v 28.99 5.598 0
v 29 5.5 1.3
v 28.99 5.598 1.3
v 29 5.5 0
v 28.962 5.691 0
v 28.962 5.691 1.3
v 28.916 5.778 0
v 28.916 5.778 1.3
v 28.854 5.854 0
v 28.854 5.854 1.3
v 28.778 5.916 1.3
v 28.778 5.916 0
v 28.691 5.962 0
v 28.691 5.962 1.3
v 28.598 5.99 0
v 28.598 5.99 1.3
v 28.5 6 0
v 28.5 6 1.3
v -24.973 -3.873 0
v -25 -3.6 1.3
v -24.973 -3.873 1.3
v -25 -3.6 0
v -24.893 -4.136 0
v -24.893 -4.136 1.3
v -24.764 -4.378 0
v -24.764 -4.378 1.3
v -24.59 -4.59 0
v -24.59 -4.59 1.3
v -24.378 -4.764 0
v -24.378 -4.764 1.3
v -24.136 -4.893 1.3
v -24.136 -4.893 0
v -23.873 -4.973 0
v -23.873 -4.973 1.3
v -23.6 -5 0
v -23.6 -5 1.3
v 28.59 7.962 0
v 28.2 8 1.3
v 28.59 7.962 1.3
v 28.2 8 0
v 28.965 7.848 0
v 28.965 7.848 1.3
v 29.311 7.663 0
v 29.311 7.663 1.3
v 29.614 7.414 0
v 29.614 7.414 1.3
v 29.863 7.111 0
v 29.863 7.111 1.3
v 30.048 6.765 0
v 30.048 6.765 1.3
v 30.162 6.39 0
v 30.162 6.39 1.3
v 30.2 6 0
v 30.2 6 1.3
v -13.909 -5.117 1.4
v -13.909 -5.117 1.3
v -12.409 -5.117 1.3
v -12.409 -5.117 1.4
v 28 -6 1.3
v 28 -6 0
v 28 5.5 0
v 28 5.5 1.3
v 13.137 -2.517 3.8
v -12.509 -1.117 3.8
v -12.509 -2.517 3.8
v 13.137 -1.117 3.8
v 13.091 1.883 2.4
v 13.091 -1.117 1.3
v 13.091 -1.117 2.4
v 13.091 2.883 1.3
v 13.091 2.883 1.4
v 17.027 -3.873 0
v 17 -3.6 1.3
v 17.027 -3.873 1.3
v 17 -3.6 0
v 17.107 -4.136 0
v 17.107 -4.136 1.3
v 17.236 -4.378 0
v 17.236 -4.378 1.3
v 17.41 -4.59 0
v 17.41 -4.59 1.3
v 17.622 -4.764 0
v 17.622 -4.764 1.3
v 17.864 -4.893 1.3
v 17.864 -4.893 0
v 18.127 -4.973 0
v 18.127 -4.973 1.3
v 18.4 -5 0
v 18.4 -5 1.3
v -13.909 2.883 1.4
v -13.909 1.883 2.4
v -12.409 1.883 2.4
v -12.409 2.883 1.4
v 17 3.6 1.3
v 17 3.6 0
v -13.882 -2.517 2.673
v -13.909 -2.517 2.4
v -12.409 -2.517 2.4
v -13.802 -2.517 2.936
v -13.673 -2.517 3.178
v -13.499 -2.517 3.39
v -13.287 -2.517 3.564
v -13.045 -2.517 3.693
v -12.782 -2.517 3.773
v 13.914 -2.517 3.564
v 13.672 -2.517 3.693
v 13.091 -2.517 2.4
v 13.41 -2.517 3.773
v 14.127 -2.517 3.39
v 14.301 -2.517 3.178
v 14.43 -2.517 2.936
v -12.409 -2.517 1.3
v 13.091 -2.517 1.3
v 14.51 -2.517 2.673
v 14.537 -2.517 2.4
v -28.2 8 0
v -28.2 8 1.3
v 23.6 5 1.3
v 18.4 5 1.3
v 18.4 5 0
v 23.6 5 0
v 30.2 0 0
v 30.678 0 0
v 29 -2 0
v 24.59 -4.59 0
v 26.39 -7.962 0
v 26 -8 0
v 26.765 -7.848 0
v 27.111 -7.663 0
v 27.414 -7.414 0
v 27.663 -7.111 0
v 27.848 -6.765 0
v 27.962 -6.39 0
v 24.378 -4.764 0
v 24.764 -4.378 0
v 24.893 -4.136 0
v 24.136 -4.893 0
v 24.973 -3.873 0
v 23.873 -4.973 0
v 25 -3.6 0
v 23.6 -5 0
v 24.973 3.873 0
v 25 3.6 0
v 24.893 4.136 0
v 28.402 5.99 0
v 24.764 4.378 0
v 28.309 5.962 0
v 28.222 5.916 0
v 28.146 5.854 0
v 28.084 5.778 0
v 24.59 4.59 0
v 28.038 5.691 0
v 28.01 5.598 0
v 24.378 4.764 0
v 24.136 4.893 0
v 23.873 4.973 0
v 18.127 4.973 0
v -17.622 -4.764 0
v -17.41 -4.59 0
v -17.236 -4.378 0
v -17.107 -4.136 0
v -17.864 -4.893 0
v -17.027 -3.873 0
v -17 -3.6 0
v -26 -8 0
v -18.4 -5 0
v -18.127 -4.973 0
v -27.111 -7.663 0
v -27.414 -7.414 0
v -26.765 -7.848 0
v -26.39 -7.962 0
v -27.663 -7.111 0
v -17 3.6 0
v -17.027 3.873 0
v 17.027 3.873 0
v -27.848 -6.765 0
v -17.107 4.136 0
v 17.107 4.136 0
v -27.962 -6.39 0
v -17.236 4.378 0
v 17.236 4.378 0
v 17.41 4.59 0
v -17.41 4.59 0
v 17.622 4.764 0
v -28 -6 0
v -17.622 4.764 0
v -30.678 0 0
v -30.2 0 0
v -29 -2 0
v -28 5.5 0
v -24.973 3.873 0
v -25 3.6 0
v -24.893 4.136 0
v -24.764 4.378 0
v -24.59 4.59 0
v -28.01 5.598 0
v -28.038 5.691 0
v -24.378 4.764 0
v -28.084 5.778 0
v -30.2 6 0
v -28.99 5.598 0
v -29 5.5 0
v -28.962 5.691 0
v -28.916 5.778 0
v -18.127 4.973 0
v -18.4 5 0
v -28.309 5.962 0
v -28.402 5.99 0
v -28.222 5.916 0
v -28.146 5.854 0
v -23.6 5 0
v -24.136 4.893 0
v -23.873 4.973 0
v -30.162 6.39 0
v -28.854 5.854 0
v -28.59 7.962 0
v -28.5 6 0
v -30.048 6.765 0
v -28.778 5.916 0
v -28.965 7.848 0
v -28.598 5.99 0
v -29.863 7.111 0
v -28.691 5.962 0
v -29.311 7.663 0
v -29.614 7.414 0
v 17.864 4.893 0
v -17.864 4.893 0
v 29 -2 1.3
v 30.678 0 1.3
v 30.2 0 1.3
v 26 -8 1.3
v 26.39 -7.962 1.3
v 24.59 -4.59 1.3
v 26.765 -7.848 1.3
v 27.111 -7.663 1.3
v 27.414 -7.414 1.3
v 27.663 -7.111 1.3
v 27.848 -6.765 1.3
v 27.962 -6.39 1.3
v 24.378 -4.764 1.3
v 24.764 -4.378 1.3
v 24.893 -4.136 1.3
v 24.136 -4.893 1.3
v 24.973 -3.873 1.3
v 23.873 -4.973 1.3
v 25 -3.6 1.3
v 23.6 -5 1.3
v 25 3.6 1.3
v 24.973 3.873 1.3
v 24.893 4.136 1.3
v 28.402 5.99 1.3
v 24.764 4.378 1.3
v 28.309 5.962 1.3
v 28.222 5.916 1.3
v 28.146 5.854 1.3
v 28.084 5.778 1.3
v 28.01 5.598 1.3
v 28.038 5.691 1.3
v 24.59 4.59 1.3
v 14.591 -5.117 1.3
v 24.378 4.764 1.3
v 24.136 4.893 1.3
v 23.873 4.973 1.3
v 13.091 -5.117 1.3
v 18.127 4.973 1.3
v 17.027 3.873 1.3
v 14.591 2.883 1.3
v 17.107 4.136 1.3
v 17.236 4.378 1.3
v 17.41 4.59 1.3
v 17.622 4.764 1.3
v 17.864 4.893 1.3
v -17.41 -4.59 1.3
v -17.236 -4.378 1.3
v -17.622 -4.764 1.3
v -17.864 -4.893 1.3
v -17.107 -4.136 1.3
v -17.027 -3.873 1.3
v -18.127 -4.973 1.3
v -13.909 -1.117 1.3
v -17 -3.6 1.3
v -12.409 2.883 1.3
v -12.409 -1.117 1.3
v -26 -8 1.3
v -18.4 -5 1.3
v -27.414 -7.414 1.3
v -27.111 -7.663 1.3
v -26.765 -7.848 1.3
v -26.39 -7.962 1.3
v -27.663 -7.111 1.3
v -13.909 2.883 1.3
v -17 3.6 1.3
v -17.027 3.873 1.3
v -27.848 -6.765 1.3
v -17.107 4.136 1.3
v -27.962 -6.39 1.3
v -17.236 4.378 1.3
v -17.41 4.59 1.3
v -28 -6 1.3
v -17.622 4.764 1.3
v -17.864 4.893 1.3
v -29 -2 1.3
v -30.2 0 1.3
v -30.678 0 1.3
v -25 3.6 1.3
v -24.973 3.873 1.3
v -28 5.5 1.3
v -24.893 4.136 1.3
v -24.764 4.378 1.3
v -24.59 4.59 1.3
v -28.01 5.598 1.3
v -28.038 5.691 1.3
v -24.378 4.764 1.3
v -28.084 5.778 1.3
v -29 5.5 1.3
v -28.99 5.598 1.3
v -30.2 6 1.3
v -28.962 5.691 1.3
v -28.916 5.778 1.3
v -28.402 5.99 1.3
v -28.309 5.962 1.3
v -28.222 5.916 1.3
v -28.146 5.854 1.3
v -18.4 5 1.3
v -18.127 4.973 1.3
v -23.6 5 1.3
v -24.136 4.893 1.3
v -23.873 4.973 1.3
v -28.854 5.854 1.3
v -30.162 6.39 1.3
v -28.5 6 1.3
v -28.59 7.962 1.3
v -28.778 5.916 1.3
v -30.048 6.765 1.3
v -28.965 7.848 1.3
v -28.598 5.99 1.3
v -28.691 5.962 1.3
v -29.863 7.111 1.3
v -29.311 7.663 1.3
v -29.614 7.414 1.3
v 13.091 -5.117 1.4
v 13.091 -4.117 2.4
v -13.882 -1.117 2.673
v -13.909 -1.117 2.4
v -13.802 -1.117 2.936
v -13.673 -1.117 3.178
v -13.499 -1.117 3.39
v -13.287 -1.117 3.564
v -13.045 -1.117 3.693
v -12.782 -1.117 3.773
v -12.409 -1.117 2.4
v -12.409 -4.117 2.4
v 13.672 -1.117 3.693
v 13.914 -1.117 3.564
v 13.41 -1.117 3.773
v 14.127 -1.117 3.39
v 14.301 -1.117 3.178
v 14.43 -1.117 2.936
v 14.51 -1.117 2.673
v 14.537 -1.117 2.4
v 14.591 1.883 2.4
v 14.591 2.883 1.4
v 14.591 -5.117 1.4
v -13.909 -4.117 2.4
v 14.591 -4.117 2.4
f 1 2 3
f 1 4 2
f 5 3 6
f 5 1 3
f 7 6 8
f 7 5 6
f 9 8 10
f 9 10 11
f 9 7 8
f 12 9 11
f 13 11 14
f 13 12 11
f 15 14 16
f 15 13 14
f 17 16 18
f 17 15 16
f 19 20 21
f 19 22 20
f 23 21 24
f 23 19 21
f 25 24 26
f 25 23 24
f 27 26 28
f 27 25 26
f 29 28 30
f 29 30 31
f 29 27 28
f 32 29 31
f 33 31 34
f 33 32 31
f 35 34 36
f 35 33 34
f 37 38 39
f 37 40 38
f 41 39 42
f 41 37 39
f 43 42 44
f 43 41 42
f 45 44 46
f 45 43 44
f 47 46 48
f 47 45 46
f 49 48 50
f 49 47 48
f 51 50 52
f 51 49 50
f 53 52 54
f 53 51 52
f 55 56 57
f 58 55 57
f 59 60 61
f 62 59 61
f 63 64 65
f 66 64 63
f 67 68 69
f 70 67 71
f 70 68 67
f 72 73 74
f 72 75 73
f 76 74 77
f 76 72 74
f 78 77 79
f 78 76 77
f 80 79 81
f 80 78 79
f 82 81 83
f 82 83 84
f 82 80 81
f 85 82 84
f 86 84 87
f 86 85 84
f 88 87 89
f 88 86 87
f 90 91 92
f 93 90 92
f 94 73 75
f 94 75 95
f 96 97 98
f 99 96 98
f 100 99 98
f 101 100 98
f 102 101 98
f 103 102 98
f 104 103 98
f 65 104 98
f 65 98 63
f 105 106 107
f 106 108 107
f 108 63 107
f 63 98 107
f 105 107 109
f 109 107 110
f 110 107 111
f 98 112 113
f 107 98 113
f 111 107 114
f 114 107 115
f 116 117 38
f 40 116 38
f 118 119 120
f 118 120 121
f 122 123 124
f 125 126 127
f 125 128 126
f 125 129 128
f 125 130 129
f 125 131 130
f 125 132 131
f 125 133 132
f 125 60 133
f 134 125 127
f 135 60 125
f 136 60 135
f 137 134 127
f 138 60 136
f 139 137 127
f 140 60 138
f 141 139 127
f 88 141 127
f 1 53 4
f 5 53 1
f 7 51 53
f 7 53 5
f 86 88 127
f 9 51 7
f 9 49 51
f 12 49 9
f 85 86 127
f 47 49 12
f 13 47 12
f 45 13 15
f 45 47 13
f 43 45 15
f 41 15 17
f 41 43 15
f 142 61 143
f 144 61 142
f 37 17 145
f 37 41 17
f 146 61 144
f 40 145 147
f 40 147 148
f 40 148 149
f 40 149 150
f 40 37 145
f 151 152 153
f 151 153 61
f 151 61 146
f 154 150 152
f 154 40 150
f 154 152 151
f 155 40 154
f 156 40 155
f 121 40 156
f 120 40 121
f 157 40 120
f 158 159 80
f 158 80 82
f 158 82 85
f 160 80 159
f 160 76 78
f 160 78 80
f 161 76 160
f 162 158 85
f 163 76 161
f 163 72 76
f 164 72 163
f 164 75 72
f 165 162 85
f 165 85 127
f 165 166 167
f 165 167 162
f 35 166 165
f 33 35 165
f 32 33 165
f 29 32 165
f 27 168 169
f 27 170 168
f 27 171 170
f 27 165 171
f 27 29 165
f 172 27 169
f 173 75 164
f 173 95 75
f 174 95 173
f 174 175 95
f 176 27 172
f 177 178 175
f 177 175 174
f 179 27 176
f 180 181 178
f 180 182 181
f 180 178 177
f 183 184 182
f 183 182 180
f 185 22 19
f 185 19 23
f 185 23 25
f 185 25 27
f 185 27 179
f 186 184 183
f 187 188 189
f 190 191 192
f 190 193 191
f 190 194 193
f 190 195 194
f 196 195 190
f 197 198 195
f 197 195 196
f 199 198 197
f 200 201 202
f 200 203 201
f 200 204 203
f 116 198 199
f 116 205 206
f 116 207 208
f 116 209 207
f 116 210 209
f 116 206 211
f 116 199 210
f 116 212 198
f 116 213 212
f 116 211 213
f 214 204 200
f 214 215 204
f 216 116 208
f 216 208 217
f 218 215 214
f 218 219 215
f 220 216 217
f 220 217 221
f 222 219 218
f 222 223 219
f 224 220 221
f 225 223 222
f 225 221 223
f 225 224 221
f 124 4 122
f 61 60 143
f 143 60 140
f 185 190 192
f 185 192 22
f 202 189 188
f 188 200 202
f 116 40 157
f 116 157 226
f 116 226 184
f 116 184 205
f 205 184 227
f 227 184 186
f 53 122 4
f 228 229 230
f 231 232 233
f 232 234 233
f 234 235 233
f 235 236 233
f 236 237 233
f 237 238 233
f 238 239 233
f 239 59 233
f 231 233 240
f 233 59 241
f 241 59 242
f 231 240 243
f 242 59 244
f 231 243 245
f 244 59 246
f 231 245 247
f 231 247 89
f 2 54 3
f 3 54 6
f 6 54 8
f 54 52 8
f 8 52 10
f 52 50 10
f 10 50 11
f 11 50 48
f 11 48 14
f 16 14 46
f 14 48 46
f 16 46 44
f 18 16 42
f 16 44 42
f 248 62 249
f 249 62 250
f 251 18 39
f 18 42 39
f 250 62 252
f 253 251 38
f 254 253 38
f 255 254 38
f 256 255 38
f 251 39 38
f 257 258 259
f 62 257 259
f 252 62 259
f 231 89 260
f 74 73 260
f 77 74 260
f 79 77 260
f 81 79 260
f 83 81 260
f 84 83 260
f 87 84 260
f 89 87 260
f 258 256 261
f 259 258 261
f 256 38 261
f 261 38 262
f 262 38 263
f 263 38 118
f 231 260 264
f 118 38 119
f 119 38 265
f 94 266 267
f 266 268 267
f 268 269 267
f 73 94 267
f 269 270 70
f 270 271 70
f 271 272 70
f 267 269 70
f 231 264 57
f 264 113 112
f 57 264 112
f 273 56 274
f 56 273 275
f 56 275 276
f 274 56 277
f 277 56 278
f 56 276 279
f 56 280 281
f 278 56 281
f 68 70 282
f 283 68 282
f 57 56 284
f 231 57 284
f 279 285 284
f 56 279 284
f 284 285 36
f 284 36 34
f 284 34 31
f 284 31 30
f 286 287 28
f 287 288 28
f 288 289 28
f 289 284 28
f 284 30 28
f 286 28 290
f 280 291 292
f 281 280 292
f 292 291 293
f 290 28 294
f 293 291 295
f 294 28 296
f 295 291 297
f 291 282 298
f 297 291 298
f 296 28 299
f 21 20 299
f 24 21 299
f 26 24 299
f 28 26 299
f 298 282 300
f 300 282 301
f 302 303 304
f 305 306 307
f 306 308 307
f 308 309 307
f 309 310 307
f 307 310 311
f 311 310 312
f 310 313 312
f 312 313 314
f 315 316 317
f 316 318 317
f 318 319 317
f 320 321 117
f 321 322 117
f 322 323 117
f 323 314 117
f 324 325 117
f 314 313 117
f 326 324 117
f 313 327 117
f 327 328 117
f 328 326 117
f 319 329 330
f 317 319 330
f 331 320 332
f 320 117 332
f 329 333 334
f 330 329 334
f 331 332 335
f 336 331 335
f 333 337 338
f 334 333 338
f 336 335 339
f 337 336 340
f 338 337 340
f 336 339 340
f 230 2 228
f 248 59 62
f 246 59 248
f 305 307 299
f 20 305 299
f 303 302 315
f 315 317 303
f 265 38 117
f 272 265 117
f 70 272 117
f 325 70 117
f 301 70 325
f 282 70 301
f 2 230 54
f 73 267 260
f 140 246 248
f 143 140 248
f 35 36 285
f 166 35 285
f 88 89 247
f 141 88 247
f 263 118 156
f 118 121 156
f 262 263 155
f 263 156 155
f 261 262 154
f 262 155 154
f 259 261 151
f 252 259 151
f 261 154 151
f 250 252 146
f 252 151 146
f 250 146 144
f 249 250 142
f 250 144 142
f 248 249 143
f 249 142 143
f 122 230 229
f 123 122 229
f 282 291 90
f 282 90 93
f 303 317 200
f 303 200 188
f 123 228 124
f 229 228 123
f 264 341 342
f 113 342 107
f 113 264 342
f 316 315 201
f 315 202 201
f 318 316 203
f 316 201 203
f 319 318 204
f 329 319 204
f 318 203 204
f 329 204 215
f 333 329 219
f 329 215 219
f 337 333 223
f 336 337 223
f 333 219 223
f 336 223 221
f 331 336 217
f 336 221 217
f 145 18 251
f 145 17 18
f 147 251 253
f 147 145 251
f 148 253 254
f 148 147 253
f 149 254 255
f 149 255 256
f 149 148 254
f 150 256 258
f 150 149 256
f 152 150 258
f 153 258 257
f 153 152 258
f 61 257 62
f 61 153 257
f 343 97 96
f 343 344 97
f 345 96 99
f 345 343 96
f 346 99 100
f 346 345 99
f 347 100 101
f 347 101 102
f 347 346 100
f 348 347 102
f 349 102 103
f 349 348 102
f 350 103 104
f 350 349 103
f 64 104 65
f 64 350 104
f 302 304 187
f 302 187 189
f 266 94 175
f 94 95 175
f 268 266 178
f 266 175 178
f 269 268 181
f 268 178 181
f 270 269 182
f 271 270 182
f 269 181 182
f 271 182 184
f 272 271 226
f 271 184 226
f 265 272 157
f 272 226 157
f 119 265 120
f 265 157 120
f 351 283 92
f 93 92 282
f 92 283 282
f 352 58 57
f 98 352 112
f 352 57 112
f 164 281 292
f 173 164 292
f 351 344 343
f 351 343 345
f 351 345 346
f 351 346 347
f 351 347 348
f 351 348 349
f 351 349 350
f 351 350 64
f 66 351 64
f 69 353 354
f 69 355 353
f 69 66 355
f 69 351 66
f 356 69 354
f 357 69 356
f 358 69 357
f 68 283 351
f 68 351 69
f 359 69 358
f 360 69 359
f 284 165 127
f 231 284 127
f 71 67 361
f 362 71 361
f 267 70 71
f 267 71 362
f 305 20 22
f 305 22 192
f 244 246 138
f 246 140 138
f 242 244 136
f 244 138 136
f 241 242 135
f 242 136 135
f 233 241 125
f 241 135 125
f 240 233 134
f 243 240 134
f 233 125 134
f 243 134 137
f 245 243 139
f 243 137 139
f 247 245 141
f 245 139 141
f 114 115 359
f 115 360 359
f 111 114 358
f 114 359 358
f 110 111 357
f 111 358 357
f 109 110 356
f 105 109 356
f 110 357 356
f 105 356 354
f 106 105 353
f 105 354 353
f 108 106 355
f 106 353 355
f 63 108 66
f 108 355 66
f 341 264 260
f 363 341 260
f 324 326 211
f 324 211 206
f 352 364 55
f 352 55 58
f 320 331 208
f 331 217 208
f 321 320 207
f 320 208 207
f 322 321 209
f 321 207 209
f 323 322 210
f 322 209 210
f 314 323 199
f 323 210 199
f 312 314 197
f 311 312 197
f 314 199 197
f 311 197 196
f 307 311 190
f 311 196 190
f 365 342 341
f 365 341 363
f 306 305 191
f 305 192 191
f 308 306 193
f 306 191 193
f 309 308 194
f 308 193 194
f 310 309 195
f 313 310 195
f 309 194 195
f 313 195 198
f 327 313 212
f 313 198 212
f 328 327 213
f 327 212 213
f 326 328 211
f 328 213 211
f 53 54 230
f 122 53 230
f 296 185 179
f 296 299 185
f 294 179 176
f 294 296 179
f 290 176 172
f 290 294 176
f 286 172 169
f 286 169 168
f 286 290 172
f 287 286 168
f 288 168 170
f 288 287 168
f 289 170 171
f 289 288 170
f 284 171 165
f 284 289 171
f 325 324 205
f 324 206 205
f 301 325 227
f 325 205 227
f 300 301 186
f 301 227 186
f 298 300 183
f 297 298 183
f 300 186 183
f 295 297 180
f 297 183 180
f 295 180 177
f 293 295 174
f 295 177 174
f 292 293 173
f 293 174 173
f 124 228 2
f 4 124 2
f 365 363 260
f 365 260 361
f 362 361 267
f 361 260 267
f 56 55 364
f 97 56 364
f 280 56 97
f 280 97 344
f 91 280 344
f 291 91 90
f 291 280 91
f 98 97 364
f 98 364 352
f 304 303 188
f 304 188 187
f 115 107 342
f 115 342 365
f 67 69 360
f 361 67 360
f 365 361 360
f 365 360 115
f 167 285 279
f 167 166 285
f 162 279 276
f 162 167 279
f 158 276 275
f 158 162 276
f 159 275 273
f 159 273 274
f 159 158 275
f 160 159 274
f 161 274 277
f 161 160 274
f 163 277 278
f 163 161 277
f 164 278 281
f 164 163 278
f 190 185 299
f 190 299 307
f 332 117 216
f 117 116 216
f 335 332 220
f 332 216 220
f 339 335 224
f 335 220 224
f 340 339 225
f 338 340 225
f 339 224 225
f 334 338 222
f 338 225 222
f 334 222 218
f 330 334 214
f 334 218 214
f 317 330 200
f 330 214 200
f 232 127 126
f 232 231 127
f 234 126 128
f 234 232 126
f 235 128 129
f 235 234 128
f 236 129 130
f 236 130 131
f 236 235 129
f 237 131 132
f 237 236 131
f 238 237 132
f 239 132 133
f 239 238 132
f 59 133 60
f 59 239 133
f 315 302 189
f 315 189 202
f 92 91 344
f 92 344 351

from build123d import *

# Parameters (mm, degrees)
SKETCH_1_W          = 56
SKETCH_1_H          = 16
EXTRUDE_1_DEPTH     = 1.3
EXTRUDE_2_DEPTH     = 1.3
FILLET_1_R          = 2
FILLET_2_R          = 0.5
CHAMFER_1_SIZE      = 2
CHAMFER_1_SIZE_2    = 2.383507185
CHAMFER_2_SIZE      = 2.383507185
CHAMFER_2_SIZE_2    = 2
SKETCH_3_W          = 1.5
SKETCH_3_H          = 8
EXTRUDE_3_DEPTH     = 1.1
CHAMFER_3_SIZE      = 1
SKETCH_4_W          = 28.445563285
SKETCH_4_H          = 1.4
EXTRUDE_4_DEPTH     = 2.5
FILLET_3_R          = 1.4
CUT_EXTRUDE_1_REACH = 33.803
SKETCH_6_W          = 8
SKETCH_6_H          = 10
FILLET_4_R          = 1.4


# Some blends are built 0.0001 mm under size
with BuildPart() as part:
    # 草图1 → 凸台-拉伸1 (new body)
    with BuildSketch(Plane.XY):
        Rectangle(SKETCH_1_W, SKETCH_1_H)
    extrude(amount=EXTRUDE_1_DEPTH)

    # 草图2 → 凸台-拉伸2 (add)
    with BuildSketch(Plane.XY.offset(1.3)):
        Polygon((28, 8), (30.2, 8), (30.2, 0), (31, 0), (31, -2), (29, -2), (29, 6), (28, 6), align=None)
        Polygon((-28, 8), (-30.2, 8), (-30.2, 0), (-31, 0), (-31, -2), (-29, -2), (-29, 6), (-28, 6), align=None)
    extrude(amount=-EXTRUDE_2_DEPTH)

    # 圆角1
    fillet_1_edges = [part.edges().sort_by_distance(p)[0] for p in [
        (-30.2, 8, 0.65),
        (30.2, 8, 0.65),
        (28, -8, 0.65),
        (-28, -8, 0.65),
    ]]
    fillet(fillet_1_edges, radius=FILLET_1_R)

    # 圆角2
    fillet_2_edges = [part.edges().sort_by_distance(p)[0] for p in [
        (28, 6, 0.65),
        (29, 6, 0.65),
        (-28, 6, 0.65),
        (-29, 6, 0.65),
    ]]
    fillet(fillet_2_edges, radius=FILLET_2_R - 0.0001)  # a hair under: the kernel refuses the full size

    # 倒角1
    # the kernel refuses this chamfer: 2.383507185, 2 mm, written as the material it takes off along each edge
    with BuildSketch(Plane(origin=(31, -2, 7.443265966), x_dir=(-0.9993728857116145, -0.03540953691366299, 0), z_dir=(0, 0, -1))) as chamfer_1_piece_1:
        Polygon((CHAMFER_1_SIZE * 0.999372885712, CHAMFER_1_SIZE * 0.0354095369137), (-CHAMFER_1_SIZE_2 * 0.0354095369165, CHAMFER_1_SIZE_2 * 0.999372885791), (0, 0), align=None)
    extrude(amount=13.586531933, mode=Mode.SUBTRACT)

    # 倒角2
    # the kernel refuses this chamfer: 2.383507185, 2 mm, written as the material it takes off along each edge
    with BuildSketch(Plane(origin=(-31, -2, 7.443265966), x_dir=(-0.024939322090233737, 0.9996889667359941, 0), z_dir=(0, 0, -1))) as chamfer_2_piece_1:
        Polygon((CHAMFER_2_SIZE * 0.999688966815, CHAMFER_2_SIZE * 0.0249393220922), (-CHAMFER_2_SIZE_2 * 0.0249393220902, CHAMFER_2_SIZE_2 * 0.999688966736), (0, 0), align=None)
    extrude(amount=13.586531933, mode=Mode.SUBTRACT)

    # 草图3 → 凸台-拉伸3 (add)
    with BuildSketch(Plane.XY.offset(1.3)):
        with Locations((-13.15891381, -1.11681071)):
            Rectangle(SKETCH_3_W, SKETCH_3_H)
        with Locations((13.84108619, -1.11681071)):
            Rectangle(SKETCH_3_W, SKETCH_3_H)
    extrude(amount=EXTRUDE_3_DEPTH)

    # 倒角3
    chamfer_3_edges = [part.edges().sort_by_distance(p)[0] for p in [
        (-13.15891381, -5.11681071, 2.4),
        (-13.15891381, 2.88318929, 2.4),
        (13.84108619, -5.11681071, 2.4),
        (13.84108619, 2.88318929, 2.4),
    ]]
    chamfer(chamfer_3_edges, length=CHAMFER_3_SIZE)

    # 草图4 → 凸台-拉伸4 (add)
    with BuildSketch(Plane.XY.offset(1.3)):
        with Locations((0.313867832, -1.81681071)):
            Rectangle(SKETCH_4_W, SKETCH_4_H)
    extrude(amount=EXTRUDE_4_DEPTH)

    # 圆角3
    fillet_3_edges = [part.edges().sort_by_distance(p)[0] for p in [
        (14.536649475, -1.81681071, 3.8),
        (-13.90891381, -1.81681071, 3.8),
    ]]
    fillet(fillet_3_edges, radius=FILLET_3_R - 0.0001)  # a hair under: the kernel refuses the full size

    # 草图6 → 切除-拉伸1 (cut, up to next)
    with BuildSketch(Plane.XY.offset(1.3), mode=Mode.PRIVATE) as cut_extrude_1_sk1:
        with Locations((-21, 0)):
            Rectangle(SKETCH_6_W, SKETCH_6_H)
    cut_extrude_1_tool1 = extrude(cut_extrude_1_sk1.sketch, amount=-CUT_EXTRUDE_1_REACH, mode=Mode.PRIVATE) & part.part
    # 草图6 → 切除-拉伸1 (cut, up to next)
    with BuildSketch(Plane.XY.offset(1.3), mode=Mode.PRIVATE) as cut_extrude_1_sk2:
        with Locations((21, 0)):
            Rectangle(SKETCH_6_W, SKETCH_6_H)
    cut_extrude_1_tool2 = extrude(cut_extrude_1_sk2.sketch, amount=-CUT_EXTRUDE_1_REACH, mode=Mode.PRIVATE) & part.part
    add(cut_extrude_1_tool1.solids().sort_by_distance((-21, 0, 1.3))[0], mode=Mode.SUBTRACT)
    add(cut_extrude_1_tool2.solids().sort_by_distance((21, 0, 1.3))[0], mode=Mode.SUBTRACT)

    # 圆角4
    fillet_4_edges = [part.edges().sort_by_distance(p)[0] for p in [
        (-17, 5, 0.65),
        (-17, -5, 0.65),
        (-25, -5, 0.65),
        (-25, 5, 0.65),
        (25, 5, 0.65),
        (25, -5, 0.65),
        (17, -5, 0.65),
        (17, 5, 0.65),
    ]]
    fillet(fillet_4_edges, radius=FILLET_4_R)


solid = part.part
